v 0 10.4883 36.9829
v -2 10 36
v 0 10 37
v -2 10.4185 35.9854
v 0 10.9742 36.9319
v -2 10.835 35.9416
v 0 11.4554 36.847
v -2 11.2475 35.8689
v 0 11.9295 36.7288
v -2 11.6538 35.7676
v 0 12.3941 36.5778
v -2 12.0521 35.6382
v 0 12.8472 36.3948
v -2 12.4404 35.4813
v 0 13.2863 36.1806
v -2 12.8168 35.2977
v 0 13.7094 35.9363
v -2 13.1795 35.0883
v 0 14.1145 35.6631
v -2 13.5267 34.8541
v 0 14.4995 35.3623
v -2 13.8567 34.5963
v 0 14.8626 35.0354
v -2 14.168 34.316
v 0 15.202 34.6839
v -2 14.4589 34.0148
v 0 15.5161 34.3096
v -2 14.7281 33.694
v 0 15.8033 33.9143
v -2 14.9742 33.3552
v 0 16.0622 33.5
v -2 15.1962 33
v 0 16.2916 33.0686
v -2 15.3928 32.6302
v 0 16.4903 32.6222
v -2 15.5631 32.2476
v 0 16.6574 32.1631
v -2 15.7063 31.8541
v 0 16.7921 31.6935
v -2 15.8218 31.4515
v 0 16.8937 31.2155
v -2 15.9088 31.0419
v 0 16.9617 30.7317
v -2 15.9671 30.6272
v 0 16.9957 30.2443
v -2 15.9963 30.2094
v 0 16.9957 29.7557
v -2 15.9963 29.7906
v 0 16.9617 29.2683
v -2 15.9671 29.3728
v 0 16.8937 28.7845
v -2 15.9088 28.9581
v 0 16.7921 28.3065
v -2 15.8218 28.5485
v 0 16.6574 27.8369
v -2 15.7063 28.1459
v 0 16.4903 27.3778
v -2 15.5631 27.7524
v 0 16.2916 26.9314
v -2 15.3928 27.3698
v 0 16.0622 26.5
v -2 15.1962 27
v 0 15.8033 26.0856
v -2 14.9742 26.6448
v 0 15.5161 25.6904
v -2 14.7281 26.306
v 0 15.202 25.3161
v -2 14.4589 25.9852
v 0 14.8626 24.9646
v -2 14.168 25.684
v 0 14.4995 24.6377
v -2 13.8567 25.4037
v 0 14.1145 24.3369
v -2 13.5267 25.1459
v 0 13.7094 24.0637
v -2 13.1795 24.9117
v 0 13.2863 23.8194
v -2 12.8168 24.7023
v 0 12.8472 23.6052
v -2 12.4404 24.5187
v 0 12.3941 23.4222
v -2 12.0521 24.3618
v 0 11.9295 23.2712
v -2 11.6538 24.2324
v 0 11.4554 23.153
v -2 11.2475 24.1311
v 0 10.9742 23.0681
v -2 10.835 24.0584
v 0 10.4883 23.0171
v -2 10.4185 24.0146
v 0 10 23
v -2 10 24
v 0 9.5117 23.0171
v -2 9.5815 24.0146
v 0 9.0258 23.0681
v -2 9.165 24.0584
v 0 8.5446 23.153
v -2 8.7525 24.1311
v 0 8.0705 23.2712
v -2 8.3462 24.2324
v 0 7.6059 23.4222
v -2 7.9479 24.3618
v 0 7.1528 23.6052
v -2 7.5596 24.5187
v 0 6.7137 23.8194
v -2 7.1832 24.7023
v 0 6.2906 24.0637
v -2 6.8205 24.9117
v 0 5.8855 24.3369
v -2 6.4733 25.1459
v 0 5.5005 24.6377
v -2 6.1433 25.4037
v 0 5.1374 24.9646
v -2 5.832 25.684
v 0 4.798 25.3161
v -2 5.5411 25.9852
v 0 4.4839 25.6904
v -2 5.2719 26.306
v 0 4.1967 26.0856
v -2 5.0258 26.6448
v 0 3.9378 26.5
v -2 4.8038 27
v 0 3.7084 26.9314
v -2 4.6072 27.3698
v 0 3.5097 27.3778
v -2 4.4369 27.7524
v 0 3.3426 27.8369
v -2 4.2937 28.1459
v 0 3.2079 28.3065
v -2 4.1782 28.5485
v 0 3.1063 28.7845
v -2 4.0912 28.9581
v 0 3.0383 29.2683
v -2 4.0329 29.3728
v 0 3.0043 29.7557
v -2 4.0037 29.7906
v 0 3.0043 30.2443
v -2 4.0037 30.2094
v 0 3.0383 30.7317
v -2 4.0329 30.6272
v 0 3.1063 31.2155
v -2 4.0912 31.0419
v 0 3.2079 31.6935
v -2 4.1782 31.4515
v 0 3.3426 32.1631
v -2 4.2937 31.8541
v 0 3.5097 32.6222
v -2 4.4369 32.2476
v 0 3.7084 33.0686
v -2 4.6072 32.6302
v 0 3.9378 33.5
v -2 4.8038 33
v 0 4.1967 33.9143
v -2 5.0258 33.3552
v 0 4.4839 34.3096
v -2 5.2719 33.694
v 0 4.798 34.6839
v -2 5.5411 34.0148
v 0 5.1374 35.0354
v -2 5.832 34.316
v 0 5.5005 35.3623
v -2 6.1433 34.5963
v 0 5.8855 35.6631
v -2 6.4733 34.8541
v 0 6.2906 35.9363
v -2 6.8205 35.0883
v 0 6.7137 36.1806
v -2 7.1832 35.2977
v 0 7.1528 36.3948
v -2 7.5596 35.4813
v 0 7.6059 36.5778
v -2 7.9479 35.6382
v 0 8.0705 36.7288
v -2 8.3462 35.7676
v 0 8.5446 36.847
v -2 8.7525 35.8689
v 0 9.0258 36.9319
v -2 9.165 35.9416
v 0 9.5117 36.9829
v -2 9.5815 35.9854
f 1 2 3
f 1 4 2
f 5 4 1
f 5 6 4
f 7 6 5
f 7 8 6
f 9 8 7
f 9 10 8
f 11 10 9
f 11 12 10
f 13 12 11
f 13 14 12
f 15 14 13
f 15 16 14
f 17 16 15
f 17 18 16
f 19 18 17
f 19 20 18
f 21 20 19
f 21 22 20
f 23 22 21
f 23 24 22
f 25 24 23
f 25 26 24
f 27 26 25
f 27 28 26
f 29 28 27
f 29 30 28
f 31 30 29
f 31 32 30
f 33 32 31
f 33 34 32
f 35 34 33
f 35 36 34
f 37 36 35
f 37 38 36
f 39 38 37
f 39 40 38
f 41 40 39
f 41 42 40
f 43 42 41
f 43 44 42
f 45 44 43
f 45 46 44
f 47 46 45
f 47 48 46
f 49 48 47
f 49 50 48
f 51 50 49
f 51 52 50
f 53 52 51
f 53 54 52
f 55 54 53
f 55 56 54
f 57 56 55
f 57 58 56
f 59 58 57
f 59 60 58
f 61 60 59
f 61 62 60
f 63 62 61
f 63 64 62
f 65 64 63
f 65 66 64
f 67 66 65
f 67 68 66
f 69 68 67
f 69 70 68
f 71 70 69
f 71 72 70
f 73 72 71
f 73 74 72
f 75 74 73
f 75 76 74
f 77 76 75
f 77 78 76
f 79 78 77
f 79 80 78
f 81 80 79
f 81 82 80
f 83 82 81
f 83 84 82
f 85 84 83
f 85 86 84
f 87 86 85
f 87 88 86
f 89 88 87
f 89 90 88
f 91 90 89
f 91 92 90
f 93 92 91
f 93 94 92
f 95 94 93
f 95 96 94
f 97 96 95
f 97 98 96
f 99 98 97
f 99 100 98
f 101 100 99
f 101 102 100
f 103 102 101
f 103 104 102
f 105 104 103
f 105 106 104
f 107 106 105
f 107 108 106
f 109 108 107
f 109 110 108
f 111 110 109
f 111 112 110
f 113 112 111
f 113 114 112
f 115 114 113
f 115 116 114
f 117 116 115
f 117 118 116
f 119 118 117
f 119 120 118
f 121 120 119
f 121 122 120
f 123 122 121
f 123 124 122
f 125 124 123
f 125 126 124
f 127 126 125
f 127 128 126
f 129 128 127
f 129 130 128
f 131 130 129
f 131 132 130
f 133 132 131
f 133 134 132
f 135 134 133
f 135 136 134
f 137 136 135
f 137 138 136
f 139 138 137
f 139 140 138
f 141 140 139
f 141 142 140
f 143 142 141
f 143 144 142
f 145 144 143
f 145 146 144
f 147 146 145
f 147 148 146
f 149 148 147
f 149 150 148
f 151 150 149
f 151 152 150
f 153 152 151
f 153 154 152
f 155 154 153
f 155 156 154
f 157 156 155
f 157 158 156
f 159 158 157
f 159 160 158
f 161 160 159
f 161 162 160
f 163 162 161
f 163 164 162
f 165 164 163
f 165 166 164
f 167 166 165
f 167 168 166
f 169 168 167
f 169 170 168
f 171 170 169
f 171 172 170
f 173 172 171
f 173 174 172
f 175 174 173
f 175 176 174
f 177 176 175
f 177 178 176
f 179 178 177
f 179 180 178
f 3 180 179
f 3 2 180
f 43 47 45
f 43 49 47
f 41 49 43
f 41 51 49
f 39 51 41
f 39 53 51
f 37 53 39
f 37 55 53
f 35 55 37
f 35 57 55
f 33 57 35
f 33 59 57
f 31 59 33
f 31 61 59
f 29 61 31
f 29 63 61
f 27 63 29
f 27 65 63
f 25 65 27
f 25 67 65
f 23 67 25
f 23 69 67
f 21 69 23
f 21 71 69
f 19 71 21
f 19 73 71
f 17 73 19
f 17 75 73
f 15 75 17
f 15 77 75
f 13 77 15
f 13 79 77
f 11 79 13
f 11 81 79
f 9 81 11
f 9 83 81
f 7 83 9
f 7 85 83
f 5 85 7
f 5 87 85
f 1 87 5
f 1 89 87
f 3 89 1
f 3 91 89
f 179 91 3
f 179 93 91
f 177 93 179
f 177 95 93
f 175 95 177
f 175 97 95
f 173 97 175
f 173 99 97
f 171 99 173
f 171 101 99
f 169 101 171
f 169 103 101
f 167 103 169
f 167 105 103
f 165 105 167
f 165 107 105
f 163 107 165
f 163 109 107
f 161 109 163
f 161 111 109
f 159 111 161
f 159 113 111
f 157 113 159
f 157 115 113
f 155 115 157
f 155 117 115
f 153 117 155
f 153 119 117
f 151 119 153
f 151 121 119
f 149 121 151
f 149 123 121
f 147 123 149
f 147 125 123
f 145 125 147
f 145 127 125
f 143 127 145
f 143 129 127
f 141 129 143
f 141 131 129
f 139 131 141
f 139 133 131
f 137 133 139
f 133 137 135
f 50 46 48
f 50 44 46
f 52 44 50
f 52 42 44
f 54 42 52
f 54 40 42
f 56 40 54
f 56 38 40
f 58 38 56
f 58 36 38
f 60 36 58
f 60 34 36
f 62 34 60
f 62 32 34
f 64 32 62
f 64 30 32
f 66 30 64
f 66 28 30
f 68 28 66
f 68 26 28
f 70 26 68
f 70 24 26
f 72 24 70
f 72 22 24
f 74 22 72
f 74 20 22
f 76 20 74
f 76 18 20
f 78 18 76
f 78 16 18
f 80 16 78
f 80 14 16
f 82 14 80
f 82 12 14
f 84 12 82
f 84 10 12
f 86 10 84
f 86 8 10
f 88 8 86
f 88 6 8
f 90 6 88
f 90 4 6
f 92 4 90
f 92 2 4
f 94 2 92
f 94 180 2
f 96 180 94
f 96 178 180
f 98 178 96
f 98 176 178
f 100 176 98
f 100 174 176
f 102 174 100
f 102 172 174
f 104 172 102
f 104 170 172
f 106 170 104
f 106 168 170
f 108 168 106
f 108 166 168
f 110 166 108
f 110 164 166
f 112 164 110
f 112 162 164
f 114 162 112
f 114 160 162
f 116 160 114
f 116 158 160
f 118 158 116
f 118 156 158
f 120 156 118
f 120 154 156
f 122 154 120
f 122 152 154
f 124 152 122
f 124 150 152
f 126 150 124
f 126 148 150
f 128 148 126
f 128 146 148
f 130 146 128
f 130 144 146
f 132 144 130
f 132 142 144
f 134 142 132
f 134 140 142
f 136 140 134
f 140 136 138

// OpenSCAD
$fn=90;
Rencaixpetit=4.75;//medir
Hencaixpetit=5;//medir
Rencaixgran=10.5;
HencaixgranAmple=3;//comprovar
HencaixgranEstret=2;//Comprovar
distAmple=2;
distEstret=3;

module servo(encaix)
{
  
  {
    cube([40,20,40]);
    translate([0,10,30])rotate([0,270,0])//continuació eix
    {
      cylinder(r1=7,r2=6,h=2,$fn=90);
      cylinder(r=6.5/2,h=6,$fn=90);
    }
  }
  translate([40,10,30])rotate([0,90,0])//eix
  {
    color([0,0,0])cylinder(r1=7,r2=6,h=2,$fn=90);
    color([213/255,181/255,79/255]) cylinder(r=3,h=6,$fn=90);
  }
  translate([40,0,0])rotate([90,0,90])//3 forats per collar
  {
    translate([10,3])cylinder(r=1,h=10,$fn=90);
    translate([10,3,3])cylinder(r=1.75,h=7,$fn=90);
    translate([3,10])cylinder(r=1,h=10,$fn=90);
    translate([3,10,3])cylinder(r=1.75,h=7,$fn=90);
    translate([17,10])cylinder(r=1,h=10,$fn=90);
    translate([17,10,3])cylinder(r=1.75,h=7,$fn=90);
  }
  rotate([0,-90,0])
  {
    translate([2.5,2.5])cylinder(r=1,h=10,$fn=90);
    translate([2.5,2.5,3])cylinder(r=1.75,h=7,$fn=90);
    translate([2.5,17.5])cylinder(r=1,h=10,$fn=90);
    translate([2.5,17.5,3])cylinder(r=1.75,h=7,$fn=90);
    translate([17.5,2.5])cylinder(r=1,h=10,$fn=90);
    translate([17.5,2.5,3])cylinder(r=1.75,h=7,$fn=90);
    translate([17.5,17.5])cylinder(r=1,h=10,$fn=90);
    translate([17.5,17.5,3])cylinder(r=1.75,h=7,$fn=90);
  }
  if(encaix==true)
  {
    translate([45,10,30])rotate([0,270,0])//continuació eix
    {
      translate([0,0,-2.5])cylinder(r=7,h=55,$fn=90);
    }
     translate([-7.5,3,30])cube([55,14,10]);
  }
}

module servoUncostat(encaix)
{
  cube([40,20,40]);
  translate([40,10,30])rotate([0,90,0])//eix
  {
    color([0,0,0])cylinder(r1=7,r2=6,h=2,$fn=90);
    color([213/255,181/255,79/255]) cylinder(r=3,h=6,$fn=90);
  }
  translate([40,0,0])rotate([90,0,90])//3 forats per collar
  {
    translate([10,3])cylinder(r=1,h=10,$fn=90);
    translate([10,3,3])cylinder(r=1.75,h=7,$fn=90);
    translate([3,10])cylinder(r=1,h=10,$fn=90);
    translate([3,10,3])cylinder(r=1.75,h=7,$fn=90);
    translate([17,10])cylinder(r=1,h=10,$fn=90);
    translate([17,10,3])cylinder(r=1.75,h=7,$fn=90);
  }
}

module encaix(ample)
{
    cylinder(r=Rencaixpetit,h=Hencaixpetit);
    if (ample)translate([0,0,distAmple])cylinder(r=Rencaixgran,h=HencaixgranAmple);
    else translate([0,0,distEstret])cylinder(r=Rencaixgran,h=HencaixgranEstret);
    translate([0,0,-1])cylinder(r=1.5,h=15);
    translate([7,0,-3])cylinder(r=1.5,h=10);
    translate([-7,0,-3])cylinder(r=1.5,h=10);
    translate([0,7,-3])cylinder(r=1.5,h=10);
    translate([0,-7,-3])cylinder(r=1.5,h=10);
    translate([0,0,-1]) cylinder(r=3,h=16);
    translate([7,0,distAmple+HencaixgranAmple+2]) cylinder(r=3,h=10);
    translate([-7,0,distAmple+HencaixgranAmple+2]) cylinder(r=3,h=10);
    translate([0,7,distAmple+HencaixgranAmple+2]) cylinder(r=3,h=10);
    translate([0,-7,distAmple+HencaixgranAmple+2]) cylinder(r=3,h=10);
}

module servoBlau()
{
      cube([22,12.2,22]);
      translate([-5,0,15.5])cube([32,12.2,3.5]);
      translate([6,6,0])cylinder(r=6,h=26);
      translate([6+6.5,6,0])cylinder(r=3,h=26);
}

module encaix_continuacio()
{
    translate([0,0,1.5])cylinder(r=Rencaixpetit,h=1.5);
    translate([0,0,distEstret])cylinder(r=Rencaixgran,h=HencaixgranEstret);
    translate([0,0,-1])cylinder(r=1.5,h=15);
    translate([7,0,-3])cylinder(r=1.5,h=10);
    translate([-7,0,-3])cylinder(r=1.5,h=10);
    translate([0,7,-3])cylinder(r=1.5,h=10);
    translate([0,-7,-3])cylinder(r=1.5,h=10);
    translate([0,0,-1]) cylinder(r=3,h=16);
    translate([7,0,distAmple+HencaixgranAmple+2]) cylinder(r=3,h=10);
    translate([-7,0,distAmple+HencaixgranAmple+2]) cylinder(r=3,h=10);
    translate([0,7,distAmple+HencaixgranAmple+2]) cylinder(r=3,h=10);
    translate([0,-7,distAmple+HencaixgranAmple+2]) cylinder(r=3,h=10);
}

translate([0,10,30])rotate([0,270,0])//continuació eix
    {
      cylinder(r1=7,r2=6,h=2,$fn=90);
  
    }
